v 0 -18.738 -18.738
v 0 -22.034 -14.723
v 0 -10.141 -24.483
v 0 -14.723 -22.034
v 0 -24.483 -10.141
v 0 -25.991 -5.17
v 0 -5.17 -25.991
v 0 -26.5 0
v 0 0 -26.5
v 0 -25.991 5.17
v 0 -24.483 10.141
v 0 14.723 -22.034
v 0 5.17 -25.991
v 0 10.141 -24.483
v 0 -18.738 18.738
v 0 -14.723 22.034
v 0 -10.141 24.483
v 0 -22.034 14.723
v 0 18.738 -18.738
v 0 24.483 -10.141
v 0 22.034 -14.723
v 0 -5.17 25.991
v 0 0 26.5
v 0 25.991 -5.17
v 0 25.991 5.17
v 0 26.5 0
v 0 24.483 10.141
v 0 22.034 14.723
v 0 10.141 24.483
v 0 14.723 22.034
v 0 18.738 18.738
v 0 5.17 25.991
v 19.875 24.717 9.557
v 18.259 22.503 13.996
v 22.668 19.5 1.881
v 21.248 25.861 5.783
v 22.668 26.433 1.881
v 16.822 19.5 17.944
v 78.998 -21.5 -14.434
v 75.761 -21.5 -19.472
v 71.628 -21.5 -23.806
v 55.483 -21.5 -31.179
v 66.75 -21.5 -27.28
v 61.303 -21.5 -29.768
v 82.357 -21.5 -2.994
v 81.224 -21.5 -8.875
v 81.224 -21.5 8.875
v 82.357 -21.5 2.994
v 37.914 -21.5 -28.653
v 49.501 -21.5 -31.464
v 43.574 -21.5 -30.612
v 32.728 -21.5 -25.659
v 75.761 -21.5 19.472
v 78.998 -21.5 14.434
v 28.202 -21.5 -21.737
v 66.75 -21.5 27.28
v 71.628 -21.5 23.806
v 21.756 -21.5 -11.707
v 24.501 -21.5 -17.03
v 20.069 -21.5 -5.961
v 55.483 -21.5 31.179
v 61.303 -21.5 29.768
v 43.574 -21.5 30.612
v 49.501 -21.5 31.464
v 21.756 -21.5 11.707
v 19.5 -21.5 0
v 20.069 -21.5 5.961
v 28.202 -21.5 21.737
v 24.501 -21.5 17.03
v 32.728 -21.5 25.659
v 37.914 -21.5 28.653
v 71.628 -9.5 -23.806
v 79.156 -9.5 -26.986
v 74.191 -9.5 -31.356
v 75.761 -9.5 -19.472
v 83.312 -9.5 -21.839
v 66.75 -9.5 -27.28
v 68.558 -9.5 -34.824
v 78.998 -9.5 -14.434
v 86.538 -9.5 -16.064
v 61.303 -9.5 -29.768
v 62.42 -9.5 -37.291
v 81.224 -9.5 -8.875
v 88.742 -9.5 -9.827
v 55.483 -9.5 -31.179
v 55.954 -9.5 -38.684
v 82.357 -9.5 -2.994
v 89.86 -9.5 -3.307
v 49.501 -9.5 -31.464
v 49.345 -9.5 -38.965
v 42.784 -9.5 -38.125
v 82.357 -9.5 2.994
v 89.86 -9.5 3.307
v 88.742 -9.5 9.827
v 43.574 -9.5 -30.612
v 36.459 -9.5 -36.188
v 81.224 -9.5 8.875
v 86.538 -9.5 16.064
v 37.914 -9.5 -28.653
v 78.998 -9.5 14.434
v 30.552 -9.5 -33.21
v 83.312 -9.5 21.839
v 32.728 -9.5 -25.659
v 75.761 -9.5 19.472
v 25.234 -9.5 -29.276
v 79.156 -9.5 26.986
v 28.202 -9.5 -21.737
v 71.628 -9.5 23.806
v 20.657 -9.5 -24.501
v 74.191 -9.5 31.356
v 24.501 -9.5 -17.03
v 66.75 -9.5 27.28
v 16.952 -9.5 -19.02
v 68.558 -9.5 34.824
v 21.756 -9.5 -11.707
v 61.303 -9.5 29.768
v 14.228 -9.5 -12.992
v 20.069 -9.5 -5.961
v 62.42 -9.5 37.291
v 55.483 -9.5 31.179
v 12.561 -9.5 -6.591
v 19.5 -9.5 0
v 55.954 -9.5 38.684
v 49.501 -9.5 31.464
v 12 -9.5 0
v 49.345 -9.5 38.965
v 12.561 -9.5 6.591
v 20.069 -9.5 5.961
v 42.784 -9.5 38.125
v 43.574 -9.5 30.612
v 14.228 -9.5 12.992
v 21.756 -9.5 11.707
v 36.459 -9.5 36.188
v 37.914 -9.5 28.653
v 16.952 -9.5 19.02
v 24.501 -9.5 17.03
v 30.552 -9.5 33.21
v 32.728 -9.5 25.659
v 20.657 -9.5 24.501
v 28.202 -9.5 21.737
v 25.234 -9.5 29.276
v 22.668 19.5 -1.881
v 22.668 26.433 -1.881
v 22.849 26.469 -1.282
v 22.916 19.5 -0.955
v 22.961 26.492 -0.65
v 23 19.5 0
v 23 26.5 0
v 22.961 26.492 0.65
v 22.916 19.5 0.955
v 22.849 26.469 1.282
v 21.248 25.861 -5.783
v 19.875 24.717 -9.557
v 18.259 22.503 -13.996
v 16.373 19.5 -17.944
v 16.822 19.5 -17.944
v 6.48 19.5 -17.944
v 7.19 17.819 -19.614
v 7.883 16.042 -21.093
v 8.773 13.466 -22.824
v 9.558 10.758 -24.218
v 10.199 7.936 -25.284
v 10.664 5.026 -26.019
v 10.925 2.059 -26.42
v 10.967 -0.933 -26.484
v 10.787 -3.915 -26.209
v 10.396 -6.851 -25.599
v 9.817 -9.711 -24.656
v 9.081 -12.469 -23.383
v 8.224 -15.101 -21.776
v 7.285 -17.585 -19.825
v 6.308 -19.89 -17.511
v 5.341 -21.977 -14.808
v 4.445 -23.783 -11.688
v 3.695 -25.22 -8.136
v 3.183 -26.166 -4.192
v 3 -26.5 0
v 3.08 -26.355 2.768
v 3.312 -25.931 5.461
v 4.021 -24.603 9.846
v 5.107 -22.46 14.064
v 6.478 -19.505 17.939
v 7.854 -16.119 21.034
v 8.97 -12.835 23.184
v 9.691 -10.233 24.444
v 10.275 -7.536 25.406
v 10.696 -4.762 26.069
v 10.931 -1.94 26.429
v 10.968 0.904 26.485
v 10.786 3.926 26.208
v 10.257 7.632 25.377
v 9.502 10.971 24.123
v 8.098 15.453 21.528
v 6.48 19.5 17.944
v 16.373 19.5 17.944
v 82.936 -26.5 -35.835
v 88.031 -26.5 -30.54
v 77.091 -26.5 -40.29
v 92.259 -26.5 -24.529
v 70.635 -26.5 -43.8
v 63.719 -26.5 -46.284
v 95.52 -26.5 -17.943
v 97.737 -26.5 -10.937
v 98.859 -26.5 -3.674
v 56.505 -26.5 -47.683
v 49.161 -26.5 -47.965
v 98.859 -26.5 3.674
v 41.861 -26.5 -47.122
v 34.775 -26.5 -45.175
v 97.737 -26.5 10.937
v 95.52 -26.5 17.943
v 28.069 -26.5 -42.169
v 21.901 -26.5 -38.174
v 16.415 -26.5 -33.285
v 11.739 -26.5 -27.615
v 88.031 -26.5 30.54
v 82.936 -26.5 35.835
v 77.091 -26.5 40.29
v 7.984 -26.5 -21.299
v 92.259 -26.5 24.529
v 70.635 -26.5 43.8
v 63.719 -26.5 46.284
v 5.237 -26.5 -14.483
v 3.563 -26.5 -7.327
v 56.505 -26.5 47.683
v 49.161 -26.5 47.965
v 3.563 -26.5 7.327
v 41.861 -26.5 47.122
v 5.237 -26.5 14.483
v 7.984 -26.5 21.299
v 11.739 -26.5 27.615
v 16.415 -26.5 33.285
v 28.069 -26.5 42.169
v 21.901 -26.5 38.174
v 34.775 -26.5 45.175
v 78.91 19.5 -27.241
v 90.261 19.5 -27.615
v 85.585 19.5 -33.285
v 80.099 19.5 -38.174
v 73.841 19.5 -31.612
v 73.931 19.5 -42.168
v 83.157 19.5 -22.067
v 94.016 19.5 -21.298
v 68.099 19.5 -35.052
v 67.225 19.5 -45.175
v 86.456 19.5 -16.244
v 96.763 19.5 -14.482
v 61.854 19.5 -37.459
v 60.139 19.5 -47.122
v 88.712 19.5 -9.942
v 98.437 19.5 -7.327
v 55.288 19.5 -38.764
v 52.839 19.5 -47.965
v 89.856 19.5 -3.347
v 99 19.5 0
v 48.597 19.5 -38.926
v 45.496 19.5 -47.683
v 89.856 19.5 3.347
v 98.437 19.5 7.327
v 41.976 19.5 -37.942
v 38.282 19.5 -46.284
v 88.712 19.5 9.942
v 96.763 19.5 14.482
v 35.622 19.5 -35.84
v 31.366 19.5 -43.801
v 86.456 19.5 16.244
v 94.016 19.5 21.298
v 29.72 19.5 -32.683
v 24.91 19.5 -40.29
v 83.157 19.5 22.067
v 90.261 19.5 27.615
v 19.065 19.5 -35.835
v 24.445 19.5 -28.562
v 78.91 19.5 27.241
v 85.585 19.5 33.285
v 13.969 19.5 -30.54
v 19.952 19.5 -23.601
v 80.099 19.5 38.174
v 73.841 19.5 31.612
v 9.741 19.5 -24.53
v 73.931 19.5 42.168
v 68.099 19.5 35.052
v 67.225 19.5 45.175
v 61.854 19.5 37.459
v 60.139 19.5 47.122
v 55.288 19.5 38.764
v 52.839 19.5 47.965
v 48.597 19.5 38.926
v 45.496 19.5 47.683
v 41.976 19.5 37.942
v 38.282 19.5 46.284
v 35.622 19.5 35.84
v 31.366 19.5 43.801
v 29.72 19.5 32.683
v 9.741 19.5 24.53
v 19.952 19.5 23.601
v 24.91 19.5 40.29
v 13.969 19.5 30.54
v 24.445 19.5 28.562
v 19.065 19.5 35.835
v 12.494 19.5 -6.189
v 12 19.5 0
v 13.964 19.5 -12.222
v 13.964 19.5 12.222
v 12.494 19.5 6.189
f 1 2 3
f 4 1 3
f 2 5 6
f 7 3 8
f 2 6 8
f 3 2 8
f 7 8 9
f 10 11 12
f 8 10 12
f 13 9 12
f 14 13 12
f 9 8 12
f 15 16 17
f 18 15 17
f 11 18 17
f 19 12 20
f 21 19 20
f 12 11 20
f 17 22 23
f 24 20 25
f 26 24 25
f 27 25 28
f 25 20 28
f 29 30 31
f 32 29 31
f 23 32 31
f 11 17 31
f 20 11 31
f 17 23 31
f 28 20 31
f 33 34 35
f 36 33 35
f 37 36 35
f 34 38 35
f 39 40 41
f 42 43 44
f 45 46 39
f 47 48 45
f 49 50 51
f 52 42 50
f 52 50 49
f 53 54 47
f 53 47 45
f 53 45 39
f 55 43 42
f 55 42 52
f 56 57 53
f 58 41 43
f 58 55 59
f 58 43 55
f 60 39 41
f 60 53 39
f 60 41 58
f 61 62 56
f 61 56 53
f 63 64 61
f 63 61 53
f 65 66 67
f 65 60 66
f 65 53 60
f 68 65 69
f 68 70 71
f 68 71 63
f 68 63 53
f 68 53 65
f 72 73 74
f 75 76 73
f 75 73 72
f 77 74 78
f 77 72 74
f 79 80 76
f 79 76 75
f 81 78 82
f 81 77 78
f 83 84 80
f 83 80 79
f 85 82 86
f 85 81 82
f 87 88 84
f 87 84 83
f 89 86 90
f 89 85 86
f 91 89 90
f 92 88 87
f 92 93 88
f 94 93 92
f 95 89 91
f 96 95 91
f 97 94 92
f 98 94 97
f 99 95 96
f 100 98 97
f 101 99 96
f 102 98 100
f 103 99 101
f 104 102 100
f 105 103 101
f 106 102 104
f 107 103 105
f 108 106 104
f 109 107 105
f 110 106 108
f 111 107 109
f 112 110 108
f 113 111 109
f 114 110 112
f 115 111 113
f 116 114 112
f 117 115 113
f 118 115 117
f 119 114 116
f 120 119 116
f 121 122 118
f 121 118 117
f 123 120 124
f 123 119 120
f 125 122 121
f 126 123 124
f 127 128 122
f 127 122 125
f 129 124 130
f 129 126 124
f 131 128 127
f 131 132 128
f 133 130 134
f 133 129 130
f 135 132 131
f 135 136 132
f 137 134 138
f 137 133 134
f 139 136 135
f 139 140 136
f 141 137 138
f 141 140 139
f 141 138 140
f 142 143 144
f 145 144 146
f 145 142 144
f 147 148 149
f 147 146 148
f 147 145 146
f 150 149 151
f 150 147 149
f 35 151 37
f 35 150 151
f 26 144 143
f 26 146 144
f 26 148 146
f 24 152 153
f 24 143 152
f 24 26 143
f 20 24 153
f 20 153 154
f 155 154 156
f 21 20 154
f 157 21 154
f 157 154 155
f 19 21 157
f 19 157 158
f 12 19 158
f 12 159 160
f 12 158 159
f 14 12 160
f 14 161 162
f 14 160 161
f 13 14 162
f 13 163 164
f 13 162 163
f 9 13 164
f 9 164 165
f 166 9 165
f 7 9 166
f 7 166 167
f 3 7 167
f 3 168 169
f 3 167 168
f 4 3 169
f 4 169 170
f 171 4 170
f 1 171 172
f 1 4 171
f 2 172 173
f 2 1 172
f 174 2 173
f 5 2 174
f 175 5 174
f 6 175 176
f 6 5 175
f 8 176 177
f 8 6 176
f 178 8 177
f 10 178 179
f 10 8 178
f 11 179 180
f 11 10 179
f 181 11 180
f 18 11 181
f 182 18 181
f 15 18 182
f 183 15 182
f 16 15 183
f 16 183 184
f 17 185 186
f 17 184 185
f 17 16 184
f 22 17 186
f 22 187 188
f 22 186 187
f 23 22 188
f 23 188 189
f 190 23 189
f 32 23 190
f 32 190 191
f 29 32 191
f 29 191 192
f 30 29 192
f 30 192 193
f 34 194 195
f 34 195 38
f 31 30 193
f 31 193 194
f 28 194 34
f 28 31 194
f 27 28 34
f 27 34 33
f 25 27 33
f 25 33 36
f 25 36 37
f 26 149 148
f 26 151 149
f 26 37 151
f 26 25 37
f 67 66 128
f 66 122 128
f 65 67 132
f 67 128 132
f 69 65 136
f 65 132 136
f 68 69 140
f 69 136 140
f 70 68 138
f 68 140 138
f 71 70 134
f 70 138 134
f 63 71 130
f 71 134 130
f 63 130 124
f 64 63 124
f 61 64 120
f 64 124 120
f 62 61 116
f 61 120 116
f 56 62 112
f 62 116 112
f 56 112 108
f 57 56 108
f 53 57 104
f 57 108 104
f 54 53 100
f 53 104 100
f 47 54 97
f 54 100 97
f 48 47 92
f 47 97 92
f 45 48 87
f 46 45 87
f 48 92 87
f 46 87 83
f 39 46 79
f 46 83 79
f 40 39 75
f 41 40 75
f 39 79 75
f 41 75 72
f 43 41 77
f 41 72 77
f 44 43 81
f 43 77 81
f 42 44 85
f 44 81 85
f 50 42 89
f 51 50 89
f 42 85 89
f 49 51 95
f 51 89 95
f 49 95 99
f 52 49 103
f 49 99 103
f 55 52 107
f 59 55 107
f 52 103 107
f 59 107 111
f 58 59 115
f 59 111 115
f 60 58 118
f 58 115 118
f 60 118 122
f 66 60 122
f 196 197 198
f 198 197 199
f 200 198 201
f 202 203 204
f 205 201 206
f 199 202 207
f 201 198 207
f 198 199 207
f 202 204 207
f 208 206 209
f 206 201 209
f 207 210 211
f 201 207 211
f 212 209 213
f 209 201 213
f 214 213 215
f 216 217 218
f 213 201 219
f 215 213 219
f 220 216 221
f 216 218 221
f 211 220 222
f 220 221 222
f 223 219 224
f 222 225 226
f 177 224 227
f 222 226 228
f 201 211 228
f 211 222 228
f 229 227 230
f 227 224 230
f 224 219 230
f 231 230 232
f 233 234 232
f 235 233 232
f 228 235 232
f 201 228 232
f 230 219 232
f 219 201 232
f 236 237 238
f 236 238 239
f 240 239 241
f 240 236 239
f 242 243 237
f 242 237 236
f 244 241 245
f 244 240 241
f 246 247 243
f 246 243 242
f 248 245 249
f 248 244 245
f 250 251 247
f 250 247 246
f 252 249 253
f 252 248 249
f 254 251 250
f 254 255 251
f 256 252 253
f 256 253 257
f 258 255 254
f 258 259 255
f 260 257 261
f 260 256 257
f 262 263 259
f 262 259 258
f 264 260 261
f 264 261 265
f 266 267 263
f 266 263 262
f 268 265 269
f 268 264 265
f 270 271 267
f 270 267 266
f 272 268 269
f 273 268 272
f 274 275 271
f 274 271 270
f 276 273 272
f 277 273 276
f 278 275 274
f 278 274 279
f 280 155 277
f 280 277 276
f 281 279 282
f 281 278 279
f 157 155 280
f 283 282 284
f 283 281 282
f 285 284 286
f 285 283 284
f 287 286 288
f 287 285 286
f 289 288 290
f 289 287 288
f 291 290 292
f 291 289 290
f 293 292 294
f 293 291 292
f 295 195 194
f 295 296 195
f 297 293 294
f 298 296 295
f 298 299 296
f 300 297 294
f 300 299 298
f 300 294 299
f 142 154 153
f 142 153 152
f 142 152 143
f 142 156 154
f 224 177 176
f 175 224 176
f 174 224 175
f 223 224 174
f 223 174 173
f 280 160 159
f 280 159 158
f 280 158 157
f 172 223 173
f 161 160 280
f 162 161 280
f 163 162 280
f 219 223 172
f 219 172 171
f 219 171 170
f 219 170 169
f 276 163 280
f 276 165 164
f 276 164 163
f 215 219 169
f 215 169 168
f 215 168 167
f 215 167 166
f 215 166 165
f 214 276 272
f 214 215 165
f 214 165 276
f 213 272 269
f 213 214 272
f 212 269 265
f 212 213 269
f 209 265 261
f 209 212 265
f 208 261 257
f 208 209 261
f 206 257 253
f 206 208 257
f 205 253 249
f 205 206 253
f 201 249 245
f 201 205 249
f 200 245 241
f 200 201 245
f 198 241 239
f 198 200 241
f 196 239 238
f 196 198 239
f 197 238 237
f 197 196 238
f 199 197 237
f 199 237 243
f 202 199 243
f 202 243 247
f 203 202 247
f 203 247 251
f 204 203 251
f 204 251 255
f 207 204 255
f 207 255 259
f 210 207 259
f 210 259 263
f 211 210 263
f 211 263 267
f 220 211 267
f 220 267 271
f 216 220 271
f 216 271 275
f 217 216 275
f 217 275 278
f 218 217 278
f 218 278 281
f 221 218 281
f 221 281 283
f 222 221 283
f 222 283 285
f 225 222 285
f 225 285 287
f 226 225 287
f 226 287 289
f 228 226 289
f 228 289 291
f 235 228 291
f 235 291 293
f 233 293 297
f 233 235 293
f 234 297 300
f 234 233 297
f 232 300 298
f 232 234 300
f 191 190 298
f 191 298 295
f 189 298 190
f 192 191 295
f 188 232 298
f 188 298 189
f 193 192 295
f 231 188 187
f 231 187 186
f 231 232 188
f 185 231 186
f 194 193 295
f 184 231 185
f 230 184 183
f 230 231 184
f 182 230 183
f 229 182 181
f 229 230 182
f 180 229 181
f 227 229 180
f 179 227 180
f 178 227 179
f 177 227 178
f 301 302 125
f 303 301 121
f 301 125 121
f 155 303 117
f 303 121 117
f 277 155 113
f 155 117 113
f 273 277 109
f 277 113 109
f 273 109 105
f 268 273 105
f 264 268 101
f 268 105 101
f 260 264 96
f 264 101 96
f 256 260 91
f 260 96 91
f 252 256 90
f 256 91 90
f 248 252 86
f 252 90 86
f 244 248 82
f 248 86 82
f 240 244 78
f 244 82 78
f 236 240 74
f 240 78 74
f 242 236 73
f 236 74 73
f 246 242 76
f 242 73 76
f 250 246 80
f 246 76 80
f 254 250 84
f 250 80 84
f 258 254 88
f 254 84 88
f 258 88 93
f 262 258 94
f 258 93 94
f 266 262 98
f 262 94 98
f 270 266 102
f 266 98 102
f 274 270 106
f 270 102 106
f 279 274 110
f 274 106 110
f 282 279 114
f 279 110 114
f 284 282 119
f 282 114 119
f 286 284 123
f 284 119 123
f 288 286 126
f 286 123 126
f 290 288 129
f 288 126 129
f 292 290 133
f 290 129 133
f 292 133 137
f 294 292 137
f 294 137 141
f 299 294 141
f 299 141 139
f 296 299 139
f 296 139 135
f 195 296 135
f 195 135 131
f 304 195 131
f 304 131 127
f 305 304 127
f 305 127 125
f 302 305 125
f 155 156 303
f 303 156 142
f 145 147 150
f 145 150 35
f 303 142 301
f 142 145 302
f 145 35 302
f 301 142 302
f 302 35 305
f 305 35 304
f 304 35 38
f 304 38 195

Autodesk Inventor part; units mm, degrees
ref_plane "YZ Plane" through (0, 0, 0) normal (1, 0, 0) x (0, 1, 0)
ref_plane "XY Plane" through (0, 0, 0) normal (0, 0, 1) x (1, 0, 0)
sketch "Sketch2" plane through (0, 0, 0) normal (1, 0, 0) x (0, 1, 0)
  circle A0 centre (0, 0) radius 26.5
  dimension "d0" = 53
extrude "Extrusion1" add sketch "Sketch2" along normal blind 51
sketch "Sketch3" plane through (0, 0, 0) normal (0, 1, 0) x (-1, 0, 0)
  line L0 (-51, 26.5) -> (-51, -26.5) projected
  circle A0 centre (-51, 0) radius 48
  circle A1 centre (-51, 0) radius 39
  line L1 (-16.6387, 18.4473) -> (-22.6683, 1.8811)
  circle A2 centre (-17.5, 0) radius 5.5
  line L2 (0, 0) -> (-51, 0) construction
  line L3 (0, 26.5) -> (0, -26.5) construction
  line L4 (-16.6387, -18.4473) -> (-22.6683, -1.8811)
  circle A3 centre (-51, 0) radius 31.5
  point P0 (-22.6683, -1.8811)
  point P1 (-20.4946, 7.8532)
  point P2 (-20.4946, -7.8532)
  dimension "d4" = 78
  dimension "d7" = 11
  dimension "d3" = 96
  dimension "d8" = 17.5
  dimension "d9" = 140
  dimension "d15" = 63
ref_plane "Work Plane1" through (0, -26.5, 0) normal (0, 1, 0) x (-1, 0, 0)
extrude "Extrusion2" add sketch "Sketch3" along normal blind 46 from surface at -26.5 contours A0 | A2 A3 L1 A1 | A2 A3 | A1 L4 A3 A2 | L1 A3 L4 A1 | A3 A2 | A2 L1 A3 | A3 L4 A2 | L1 A2 L4 A3
ref_plane "Work Plane2" through (0, -9.5, 0) normal (0, 1, 0) x (-1, 0, 0)
extrude "Extrusion3" cut sketch "Sketch3" along normal up to surface (29 mm away) from surface at -9.5 contours A2 A3 L1 A1 | A2 A3 | A1 L4 A3 A2 | L1 A3 L4 A1 | A3 A2 | A2 L1 A3 | A3 L4 A2 | L1 A2 L4 A3
extrude "Extrusion4" cut sketch "Sketch3" along normal through all contours L1 A3 L4 A1 | L1 A2 L4 A3
extrude "Extrusion5" cut sketch "Sketch3" against normal blind 12 from surface at -9.5 contours A3 A2 | A2 L1 A3 | A3 L4 A2 | L1 A2 L4 A3 picked at (-20.6688, -0.7652)
properties part number "hip_right"
